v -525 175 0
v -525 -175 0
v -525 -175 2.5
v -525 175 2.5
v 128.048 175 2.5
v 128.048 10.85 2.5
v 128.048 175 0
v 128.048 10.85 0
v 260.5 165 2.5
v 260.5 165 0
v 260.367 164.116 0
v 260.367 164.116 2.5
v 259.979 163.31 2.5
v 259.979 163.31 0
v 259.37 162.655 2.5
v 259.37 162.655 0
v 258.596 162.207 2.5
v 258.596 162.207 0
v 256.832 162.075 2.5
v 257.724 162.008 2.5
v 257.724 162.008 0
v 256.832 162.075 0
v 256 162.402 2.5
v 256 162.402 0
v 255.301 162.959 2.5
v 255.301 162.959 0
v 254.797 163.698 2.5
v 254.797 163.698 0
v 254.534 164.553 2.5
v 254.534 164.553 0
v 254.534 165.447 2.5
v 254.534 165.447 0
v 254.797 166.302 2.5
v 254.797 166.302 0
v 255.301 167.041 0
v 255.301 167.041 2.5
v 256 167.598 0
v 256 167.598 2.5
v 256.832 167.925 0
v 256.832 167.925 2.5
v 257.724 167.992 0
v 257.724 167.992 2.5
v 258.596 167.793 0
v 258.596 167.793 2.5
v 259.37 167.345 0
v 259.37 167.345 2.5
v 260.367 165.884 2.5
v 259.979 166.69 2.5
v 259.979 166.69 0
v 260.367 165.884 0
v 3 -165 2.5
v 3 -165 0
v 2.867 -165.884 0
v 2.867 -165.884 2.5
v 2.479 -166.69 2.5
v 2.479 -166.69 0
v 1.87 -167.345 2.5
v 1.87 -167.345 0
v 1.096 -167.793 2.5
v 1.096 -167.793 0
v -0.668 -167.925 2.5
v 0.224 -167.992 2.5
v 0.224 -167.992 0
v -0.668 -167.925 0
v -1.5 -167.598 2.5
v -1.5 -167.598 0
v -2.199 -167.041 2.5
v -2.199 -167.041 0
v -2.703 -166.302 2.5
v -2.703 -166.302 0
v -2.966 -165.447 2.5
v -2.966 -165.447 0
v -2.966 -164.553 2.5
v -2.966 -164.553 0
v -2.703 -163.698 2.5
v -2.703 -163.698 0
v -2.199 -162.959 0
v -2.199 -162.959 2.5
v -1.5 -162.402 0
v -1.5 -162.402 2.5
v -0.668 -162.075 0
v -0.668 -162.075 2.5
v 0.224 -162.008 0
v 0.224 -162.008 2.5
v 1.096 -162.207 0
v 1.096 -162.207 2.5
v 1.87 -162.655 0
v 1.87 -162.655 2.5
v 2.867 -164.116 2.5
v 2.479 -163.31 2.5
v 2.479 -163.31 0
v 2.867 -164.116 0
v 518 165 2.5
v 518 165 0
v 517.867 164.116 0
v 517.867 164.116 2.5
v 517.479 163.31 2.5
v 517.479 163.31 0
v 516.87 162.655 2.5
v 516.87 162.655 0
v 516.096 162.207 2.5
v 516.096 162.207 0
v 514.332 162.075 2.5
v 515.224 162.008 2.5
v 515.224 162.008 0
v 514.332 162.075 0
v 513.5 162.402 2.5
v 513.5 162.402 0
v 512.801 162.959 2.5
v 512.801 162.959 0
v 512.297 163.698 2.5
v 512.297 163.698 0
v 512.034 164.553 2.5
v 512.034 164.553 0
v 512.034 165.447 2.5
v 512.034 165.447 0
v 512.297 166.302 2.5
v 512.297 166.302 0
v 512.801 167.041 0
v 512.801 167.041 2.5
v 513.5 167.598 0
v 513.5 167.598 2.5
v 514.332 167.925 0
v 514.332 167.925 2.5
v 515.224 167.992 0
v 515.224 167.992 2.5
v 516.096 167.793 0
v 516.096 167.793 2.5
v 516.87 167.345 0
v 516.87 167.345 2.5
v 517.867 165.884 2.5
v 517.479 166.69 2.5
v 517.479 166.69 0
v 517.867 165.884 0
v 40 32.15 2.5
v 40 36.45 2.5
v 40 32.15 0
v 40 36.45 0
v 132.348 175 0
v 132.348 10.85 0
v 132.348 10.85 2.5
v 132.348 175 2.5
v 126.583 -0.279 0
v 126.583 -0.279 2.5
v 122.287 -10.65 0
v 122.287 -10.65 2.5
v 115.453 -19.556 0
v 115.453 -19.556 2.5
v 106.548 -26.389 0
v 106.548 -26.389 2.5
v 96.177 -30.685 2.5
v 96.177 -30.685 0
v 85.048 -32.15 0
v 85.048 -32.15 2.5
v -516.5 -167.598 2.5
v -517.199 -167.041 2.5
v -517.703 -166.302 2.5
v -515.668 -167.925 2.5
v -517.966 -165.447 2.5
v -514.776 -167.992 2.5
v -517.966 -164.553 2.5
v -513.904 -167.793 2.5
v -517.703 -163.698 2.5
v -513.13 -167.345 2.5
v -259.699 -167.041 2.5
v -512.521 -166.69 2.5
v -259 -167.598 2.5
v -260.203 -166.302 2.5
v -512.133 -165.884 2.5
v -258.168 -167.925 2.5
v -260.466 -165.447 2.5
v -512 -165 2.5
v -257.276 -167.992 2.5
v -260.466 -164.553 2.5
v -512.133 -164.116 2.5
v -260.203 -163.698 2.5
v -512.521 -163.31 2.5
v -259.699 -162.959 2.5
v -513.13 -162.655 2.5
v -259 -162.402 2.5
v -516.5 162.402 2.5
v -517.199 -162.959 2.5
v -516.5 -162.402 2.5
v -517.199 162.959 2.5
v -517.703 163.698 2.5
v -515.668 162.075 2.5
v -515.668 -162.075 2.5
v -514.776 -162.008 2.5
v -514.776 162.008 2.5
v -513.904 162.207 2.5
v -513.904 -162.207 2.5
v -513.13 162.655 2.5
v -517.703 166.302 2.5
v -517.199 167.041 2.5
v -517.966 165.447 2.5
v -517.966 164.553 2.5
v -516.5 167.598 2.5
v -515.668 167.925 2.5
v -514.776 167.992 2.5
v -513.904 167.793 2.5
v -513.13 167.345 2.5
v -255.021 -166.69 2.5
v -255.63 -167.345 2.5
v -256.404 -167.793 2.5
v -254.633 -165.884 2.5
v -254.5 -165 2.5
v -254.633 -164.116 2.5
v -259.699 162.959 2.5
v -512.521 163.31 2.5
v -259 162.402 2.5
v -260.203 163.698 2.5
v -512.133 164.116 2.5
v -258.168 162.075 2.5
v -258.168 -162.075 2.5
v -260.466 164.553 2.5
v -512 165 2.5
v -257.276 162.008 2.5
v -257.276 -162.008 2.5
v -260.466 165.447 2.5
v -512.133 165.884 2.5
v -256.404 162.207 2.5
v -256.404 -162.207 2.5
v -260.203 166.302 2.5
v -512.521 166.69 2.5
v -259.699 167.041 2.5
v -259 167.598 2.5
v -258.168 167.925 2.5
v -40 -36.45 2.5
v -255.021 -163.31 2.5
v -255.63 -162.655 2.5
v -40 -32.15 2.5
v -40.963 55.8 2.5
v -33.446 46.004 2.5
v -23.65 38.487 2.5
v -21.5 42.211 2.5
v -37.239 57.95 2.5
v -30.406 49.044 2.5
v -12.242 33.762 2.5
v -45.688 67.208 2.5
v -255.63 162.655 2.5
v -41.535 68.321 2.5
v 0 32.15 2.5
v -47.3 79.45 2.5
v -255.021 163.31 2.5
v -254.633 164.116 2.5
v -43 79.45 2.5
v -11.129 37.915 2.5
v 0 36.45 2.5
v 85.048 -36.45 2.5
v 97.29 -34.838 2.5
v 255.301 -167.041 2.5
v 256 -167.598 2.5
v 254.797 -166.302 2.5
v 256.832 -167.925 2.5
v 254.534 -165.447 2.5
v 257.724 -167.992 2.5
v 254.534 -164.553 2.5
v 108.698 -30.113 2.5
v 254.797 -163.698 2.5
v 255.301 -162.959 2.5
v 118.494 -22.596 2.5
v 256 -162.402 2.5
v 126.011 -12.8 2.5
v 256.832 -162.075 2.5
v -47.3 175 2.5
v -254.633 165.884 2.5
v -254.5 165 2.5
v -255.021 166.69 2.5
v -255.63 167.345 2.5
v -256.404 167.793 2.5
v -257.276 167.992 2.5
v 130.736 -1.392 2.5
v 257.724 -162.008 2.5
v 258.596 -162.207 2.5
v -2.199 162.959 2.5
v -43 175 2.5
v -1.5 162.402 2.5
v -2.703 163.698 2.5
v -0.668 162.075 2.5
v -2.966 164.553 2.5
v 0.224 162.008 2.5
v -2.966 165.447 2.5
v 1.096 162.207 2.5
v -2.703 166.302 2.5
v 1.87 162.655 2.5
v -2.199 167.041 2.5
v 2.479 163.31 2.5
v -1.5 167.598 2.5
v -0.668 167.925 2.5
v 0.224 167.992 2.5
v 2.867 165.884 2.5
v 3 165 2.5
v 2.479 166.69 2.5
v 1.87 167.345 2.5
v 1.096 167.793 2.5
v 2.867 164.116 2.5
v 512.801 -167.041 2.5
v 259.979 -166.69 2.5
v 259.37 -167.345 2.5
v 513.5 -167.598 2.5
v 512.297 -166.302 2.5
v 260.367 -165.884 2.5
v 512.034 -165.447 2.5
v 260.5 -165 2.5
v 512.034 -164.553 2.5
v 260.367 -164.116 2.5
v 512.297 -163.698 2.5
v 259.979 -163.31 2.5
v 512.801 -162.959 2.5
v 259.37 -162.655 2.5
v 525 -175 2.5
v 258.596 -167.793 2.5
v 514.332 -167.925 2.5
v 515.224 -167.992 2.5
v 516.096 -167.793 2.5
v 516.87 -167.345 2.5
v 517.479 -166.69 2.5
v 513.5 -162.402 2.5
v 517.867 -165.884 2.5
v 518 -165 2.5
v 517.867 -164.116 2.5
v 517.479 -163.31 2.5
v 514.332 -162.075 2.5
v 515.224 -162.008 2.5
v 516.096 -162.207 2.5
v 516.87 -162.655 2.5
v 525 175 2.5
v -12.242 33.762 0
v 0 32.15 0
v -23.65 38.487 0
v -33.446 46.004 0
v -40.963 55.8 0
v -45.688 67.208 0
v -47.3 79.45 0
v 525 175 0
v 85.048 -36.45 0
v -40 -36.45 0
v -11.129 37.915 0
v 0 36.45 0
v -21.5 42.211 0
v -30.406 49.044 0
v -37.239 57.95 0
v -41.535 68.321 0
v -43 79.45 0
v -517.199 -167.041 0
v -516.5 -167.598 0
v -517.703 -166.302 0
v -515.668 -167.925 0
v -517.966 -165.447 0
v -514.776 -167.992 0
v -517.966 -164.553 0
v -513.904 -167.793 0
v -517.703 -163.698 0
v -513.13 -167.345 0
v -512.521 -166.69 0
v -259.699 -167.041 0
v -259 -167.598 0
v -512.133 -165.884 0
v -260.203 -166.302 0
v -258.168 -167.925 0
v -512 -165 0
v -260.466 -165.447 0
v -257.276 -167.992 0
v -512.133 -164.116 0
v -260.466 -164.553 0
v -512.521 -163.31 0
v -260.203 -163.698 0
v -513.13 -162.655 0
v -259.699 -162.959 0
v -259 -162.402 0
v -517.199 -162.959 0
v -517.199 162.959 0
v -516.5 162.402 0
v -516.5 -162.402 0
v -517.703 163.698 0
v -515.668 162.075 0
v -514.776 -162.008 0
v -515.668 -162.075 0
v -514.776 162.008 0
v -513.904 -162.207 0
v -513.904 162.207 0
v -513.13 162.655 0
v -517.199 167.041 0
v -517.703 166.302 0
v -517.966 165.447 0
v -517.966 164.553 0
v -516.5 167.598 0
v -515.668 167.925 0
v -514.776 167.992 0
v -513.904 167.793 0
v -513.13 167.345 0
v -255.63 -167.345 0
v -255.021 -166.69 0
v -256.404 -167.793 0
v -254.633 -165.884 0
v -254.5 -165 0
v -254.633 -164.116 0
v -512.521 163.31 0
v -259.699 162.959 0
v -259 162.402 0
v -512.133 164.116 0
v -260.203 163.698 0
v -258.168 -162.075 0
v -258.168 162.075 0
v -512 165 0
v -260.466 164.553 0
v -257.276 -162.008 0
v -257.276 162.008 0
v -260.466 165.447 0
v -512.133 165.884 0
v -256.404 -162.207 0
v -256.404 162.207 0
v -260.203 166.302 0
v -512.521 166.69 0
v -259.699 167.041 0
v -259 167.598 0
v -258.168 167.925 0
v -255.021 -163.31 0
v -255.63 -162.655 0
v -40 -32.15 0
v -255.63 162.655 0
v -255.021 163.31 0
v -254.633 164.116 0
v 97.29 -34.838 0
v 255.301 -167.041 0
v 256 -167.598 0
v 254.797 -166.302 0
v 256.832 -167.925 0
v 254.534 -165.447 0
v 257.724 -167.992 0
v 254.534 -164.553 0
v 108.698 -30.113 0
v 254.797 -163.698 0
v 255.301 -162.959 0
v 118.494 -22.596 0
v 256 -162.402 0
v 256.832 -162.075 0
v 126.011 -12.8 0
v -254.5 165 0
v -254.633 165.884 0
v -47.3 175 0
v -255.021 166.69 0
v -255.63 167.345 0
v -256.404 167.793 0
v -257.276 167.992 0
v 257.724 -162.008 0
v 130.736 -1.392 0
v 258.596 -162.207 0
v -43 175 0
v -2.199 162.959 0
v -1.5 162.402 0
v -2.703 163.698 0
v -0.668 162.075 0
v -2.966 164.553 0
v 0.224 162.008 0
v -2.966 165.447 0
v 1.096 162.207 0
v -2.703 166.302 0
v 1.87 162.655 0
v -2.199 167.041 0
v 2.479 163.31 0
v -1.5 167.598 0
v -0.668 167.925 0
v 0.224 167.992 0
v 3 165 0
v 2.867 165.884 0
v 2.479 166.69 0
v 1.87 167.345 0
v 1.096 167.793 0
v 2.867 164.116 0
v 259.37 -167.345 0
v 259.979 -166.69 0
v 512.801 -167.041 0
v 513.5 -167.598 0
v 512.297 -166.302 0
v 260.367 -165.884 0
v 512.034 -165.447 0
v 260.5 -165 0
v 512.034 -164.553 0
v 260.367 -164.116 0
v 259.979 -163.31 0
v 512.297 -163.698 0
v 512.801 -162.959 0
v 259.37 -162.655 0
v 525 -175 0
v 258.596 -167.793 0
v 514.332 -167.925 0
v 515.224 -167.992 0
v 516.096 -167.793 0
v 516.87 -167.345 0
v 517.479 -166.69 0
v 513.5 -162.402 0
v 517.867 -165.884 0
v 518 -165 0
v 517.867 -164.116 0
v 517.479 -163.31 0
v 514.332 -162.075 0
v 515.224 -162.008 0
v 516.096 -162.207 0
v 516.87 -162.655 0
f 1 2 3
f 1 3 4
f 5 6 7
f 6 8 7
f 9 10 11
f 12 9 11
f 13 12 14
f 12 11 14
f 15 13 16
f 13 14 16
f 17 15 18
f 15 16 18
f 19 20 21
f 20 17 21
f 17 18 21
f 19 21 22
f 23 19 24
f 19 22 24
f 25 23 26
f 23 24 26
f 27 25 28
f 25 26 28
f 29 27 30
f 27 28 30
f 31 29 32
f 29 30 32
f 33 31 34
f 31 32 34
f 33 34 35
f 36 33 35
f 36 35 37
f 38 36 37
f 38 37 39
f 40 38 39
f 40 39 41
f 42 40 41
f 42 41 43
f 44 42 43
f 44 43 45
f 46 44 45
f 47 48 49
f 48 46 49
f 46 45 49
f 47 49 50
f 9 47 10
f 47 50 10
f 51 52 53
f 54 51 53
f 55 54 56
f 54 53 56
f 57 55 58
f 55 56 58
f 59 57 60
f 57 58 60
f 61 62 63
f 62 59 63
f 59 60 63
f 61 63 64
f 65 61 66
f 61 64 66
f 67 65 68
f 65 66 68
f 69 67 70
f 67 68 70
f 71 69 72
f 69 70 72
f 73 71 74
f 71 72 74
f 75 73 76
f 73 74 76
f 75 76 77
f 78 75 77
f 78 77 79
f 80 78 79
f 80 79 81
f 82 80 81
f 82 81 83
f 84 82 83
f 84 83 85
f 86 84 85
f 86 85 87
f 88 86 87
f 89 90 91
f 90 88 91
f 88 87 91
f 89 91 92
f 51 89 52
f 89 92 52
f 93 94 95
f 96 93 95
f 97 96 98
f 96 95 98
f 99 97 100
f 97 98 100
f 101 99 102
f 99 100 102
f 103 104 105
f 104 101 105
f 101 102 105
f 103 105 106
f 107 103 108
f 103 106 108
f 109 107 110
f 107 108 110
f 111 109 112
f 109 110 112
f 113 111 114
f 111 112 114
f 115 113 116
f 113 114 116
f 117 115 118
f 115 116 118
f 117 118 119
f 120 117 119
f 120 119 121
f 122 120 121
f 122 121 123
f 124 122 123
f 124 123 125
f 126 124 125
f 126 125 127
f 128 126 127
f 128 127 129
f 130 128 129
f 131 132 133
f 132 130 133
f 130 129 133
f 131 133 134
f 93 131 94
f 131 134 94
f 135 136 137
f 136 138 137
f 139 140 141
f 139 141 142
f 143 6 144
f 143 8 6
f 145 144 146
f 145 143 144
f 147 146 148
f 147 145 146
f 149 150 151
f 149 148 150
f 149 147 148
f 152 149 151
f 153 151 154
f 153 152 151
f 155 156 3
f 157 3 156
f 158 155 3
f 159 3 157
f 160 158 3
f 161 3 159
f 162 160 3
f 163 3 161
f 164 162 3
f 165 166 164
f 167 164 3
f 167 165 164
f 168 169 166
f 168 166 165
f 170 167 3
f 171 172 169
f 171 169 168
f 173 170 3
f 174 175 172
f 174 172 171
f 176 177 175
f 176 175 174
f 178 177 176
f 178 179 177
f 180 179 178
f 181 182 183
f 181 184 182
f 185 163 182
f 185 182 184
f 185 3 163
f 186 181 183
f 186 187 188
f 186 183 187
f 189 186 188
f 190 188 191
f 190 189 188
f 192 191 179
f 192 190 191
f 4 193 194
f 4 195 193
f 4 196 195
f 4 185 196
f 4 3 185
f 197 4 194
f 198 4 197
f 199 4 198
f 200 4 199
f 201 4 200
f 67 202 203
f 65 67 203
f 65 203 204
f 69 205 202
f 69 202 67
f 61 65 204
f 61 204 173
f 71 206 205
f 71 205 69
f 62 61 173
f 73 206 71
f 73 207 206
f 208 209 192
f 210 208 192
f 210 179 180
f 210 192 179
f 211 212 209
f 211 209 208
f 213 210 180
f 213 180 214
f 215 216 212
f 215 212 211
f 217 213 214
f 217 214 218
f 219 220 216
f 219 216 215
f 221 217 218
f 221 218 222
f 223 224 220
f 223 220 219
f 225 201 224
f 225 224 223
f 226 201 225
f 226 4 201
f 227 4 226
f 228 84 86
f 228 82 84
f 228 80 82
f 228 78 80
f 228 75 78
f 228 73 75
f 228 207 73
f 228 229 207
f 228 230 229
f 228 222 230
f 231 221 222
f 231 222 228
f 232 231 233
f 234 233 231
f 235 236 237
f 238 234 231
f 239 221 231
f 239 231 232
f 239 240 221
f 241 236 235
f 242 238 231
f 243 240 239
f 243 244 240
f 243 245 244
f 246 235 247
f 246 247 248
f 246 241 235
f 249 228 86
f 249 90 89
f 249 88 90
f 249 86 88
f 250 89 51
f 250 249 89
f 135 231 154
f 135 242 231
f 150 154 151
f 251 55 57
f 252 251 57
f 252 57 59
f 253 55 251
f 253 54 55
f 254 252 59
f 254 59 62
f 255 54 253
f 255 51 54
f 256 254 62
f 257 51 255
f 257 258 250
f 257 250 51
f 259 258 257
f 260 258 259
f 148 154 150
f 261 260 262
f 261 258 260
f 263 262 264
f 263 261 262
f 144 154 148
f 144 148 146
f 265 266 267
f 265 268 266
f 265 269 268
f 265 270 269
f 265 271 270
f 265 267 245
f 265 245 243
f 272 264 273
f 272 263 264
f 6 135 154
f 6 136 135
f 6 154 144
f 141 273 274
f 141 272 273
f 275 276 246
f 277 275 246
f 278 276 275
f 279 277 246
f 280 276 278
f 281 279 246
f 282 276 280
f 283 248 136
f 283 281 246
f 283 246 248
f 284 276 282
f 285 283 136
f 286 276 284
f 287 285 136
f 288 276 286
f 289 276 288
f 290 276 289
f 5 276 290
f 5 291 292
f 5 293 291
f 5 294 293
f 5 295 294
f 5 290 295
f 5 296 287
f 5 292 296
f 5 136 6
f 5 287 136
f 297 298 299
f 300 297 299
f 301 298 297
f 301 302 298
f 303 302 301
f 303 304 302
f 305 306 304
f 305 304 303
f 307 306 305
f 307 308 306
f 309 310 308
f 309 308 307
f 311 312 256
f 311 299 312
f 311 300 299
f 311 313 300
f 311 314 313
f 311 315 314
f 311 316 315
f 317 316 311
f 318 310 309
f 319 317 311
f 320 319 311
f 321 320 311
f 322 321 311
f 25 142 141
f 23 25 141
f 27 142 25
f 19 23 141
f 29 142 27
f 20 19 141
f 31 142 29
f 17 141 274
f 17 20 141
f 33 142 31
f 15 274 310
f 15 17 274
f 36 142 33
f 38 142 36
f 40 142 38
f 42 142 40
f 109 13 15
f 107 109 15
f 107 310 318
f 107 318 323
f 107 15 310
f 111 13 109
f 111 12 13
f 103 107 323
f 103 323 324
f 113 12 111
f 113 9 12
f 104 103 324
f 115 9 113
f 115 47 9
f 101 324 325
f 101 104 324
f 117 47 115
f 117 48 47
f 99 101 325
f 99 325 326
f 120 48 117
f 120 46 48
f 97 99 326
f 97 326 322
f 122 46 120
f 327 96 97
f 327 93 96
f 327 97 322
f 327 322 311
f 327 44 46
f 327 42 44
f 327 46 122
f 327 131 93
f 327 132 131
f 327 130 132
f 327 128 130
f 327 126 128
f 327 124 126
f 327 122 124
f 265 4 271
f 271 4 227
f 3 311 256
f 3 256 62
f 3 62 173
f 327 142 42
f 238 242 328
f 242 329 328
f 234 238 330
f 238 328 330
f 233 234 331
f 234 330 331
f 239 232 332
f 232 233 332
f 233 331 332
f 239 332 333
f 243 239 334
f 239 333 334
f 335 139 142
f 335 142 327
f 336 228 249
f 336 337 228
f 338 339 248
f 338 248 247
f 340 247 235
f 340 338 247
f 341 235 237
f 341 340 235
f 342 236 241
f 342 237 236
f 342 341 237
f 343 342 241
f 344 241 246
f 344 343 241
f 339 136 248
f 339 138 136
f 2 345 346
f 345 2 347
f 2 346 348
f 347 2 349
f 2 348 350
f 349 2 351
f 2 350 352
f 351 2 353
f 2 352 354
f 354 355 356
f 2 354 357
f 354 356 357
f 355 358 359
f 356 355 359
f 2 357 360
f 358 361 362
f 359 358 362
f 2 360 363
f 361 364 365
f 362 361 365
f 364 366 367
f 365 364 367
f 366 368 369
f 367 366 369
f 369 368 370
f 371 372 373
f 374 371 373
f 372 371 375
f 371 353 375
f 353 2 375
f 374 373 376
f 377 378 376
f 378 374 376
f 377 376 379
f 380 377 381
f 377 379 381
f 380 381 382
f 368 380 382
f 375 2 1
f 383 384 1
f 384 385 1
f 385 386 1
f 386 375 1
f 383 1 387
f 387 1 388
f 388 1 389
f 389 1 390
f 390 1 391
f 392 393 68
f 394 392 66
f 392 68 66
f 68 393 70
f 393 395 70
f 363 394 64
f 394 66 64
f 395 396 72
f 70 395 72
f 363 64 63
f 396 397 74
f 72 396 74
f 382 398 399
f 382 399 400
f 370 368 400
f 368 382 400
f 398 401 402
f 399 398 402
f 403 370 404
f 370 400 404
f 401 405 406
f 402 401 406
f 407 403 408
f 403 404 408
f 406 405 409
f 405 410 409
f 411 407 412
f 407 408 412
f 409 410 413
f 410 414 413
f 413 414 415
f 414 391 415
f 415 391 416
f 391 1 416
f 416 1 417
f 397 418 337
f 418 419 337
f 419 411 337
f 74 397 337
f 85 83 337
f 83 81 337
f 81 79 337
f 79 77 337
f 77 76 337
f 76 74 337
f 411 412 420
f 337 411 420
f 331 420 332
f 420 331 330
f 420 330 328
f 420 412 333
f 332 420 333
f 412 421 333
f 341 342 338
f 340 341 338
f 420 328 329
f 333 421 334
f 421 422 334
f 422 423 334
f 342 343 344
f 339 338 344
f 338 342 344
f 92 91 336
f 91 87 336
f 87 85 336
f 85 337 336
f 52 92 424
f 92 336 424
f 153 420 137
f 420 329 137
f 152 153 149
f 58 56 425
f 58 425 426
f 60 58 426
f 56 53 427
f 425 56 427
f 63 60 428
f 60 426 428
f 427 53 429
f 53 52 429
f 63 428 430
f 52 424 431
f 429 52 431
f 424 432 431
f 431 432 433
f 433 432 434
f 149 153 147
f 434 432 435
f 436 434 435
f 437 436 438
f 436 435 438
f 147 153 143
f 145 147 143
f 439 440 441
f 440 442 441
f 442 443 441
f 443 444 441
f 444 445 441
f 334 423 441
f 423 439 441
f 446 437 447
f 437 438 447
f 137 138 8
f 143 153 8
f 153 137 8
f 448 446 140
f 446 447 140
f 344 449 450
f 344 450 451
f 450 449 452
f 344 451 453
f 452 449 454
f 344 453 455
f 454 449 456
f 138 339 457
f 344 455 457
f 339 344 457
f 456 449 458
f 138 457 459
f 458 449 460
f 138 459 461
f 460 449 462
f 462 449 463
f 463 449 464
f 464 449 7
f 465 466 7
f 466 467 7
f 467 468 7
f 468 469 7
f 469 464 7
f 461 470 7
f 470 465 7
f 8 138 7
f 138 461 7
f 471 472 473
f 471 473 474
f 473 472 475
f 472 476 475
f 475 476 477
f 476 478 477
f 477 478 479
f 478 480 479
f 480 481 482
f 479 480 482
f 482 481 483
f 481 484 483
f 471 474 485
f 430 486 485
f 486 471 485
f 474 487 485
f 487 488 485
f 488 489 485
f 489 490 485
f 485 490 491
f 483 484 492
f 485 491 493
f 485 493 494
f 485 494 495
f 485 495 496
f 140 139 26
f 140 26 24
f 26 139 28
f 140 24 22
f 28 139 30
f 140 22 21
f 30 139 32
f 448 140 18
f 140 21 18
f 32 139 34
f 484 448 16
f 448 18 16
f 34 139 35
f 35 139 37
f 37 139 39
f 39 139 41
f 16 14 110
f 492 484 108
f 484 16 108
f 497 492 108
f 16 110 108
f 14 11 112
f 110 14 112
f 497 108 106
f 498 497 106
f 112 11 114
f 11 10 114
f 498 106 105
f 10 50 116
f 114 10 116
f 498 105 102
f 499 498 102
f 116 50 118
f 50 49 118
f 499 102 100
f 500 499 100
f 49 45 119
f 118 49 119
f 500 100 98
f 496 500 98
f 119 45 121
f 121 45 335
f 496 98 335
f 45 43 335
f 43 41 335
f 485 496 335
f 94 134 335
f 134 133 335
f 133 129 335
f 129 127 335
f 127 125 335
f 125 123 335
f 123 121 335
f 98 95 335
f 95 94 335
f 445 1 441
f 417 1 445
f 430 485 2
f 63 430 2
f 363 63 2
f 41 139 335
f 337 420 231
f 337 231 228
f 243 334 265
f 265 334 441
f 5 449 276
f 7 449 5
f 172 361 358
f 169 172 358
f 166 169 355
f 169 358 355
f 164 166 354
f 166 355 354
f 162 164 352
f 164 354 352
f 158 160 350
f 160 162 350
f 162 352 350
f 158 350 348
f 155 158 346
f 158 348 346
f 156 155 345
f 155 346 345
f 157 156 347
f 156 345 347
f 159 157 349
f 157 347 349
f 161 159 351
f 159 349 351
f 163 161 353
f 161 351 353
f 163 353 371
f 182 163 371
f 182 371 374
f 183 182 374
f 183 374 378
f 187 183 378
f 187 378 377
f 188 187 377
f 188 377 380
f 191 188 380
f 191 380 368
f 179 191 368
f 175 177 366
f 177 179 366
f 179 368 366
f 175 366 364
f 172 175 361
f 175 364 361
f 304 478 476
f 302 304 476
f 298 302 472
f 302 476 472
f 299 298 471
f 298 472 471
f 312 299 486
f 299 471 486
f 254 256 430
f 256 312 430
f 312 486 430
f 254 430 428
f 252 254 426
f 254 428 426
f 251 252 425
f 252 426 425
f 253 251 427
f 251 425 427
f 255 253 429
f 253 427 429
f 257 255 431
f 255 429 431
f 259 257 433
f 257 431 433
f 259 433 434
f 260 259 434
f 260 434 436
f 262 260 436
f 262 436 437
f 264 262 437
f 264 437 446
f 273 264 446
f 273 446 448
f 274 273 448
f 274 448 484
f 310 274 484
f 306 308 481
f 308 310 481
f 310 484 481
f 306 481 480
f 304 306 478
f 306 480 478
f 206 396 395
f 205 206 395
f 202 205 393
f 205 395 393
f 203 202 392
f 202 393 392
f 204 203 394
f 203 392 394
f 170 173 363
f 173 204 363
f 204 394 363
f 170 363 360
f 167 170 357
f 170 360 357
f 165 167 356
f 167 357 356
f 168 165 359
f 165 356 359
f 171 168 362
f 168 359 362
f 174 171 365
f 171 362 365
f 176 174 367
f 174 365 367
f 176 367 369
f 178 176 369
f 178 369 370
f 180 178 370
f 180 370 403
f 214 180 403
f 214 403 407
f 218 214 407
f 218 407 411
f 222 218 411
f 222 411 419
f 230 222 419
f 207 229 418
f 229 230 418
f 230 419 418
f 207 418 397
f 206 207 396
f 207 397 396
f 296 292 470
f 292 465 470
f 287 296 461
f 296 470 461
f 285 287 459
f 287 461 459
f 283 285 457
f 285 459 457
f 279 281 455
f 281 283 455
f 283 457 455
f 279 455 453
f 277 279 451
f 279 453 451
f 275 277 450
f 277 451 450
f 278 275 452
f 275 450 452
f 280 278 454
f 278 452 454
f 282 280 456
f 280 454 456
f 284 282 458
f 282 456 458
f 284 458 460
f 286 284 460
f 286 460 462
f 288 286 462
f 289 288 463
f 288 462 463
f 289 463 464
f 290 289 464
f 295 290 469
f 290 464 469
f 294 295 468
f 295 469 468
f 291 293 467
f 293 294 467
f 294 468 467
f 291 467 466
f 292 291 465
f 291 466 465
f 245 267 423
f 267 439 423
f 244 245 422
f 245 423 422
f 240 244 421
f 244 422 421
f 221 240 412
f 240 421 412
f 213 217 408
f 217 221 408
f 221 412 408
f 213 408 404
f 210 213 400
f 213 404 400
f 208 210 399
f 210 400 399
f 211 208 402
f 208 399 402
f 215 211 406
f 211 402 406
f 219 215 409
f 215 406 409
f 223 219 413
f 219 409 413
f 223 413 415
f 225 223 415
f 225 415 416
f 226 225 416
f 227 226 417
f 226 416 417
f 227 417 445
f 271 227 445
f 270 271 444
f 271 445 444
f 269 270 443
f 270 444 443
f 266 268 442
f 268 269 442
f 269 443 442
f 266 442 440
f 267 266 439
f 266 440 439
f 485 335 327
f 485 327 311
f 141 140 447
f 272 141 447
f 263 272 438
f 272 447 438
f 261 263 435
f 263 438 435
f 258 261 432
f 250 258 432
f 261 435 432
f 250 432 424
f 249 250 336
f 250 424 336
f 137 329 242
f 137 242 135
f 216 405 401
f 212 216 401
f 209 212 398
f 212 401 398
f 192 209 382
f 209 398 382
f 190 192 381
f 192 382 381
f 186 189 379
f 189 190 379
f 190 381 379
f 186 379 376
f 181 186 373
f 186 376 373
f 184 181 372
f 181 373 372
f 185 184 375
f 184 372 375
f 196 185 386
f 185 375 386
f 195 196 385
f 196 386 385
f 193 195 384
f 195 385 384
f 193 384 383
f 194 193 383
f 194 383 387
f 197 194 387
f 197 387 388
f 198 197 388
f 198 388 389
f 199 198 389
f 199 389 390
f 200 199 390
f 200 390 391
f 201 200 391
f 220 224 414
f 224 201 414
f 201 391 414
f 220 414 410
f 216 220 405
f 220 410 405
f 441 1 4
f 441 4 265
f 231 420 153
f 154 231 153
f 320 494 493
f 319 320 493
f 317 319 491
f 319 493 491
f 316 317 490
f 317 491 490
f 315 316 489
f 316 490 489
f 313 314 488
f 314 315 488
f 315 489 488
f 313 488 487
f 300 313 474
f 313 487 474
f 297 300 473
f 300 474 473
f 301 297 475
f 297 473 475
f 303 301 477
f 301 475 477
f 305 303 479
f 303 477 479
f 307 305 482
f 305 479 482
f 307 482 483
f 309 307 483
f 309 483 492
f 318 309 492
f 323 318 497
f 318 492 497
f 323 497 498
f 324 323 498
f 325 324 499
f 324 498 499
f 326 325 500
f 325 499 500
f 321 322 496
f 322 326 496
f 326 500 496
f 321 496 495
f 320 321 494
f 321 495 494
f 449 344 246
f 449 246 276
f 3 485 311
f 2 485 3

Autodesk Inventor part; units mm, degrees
ref_plane "YZ Plane" through (0, 0, 0) normal (1, 0, 0) x (0, 1, 0)
ref_plane "XZ Plane" through (0, 0, 0) normal (0, 1, 0) x (-1, 0, 0)
ref_plane "XY Plane" through (0, 0, 0) normal (0, 0, 1) x (1, 0, 0)
sketch "Sketch1" plane through (0, 0, 0) normal (0, 0, 1) x (1, 0, 0)
  line L0 (-525, 175) -> (525, 175)
  line L1 (-525, -175) -> (-525, 175)
  line L2 (525, -175) -> (-525, -175)
  line L3 (525, 175) -> (525, -175)
  circle A0 centre (515, -165) radius 3
  circle A1 centre (-257.5, -165) radius 3
  circle A2 centre (515, 165) radius 3
  circle A3 centre (257.5, 165) radius 3
  circle A4 centre (0, 165) radius 3
  circle A5 centre (-257.5, 165) radius 3
  circle A6 centre (-515, 165) radius 3
  circle A7 centre (257.5, -165) radius 3
  circle A8 centre (0, -165) radius 3
  circle A9 centre (-515, -165) radius 3
  arc A10 (-434.5, -36.45) -> (-475.35, -77.3) centre (-434.5, -77.3) ccw
  line L4 (-475.35, -85.5) -> (-475.35, -77.3)
  arc A11 (-475.35, -85.5) -> (-434.5, -126.35) centre (-434.5, -85.5) ccw
  line L5 (434.5, -126.35) -> (-434.5, -126.35)
  arc A12 (434.5, -126.35) -> (475.35, -85.5) centre (434.5, -85.5) ccw
  line L6 (475.35, -65.8667) -> (475.35, -85.5)
  arc A13 (475.35, -65.8667) -> (434.5, -25.0167) centre (434.5, -65.8667) ccw
  line L7 (-445.75, -25.0167) -> (434.5, -25.0167)
  arc A14 (-445.75, -25.0167) -> (-486.6, -65.8667) centre (-445.75, -65.8667) ccw
  line L8 (-486.6, -96.25) -> (-486.6, -65.8667)
  arc A15 (-486.6, -96.25) -> (-445.75, -137.1) centre (-445.75, -96.25) ccw
  line L9 (445.75, -137.1) -> (-445.75, -137.1)
  arc A16 (445.75, -137.1) -> (486.6, -96.25) centre (445.75, -96.25) ccw
  line L10 (486.6, -54.4333) -> (486.6, -96.25)
  arc A17 (486.6, -54.4333) -> (445.75, -13.5833) centre (445.75, -54.4333) ccw
  line L11 (-457, -13.5833) -> (445.75, -13.5833)
  arc A18 (-457, -13.5833) -> (-497.85, -54.4333) centre (-457, -54.4333) ccw
  line L12 (-497.85, -107) -> (-497.85, -54.4333)
  arc A19 (-497.85, -107) -> (-457, -147.85) centre (-457, -107) ccw
  line L13 (457, -147.85) -> (-457, -147.85)
  arc A20 (457, -147.85) -> (497.85, -107) centre (457, -107) ccw
  line L14 (497.85, -43) -> (497.85, -107)
  arc A21 (497.85, -43) -> (457, -2.15) centre (457, -43) ccw
  line L15 (-457, -2.15) -> (457, -2.15)
  arc A22 (-502.15, 43) -> (-457, -2.15) centre (-457, 43) ccw
  line L16 (-502.15, 107) -> (-502.15, 43)
  arc A23 (-457, 152.15) -> (-502.15, 107) centre (-457, 107) ccw
  line L17 (457, 152.15) -> (-457, 152.15)
  arc A24 (502.15, 107) -> (457, 152.15) centre (457, 107) ccw
  line L18 (502.15, 54.4333) -> (502.15, 107)
  arc A25 (457, 9.2833) -> (502.15, 54.4333) centre (457, 54.4333) ccw
  line L19 (-445.75, 9.2833) -> (457, 9.2833)
  arc A26 (-490.9, 54.4333) -> (-445.75, 9.2833) centre (-445.75, 54.4333) ccw
  line L20 (-490.9, 96.25) -> (-490.9, 54.4333)
  arc A27 (-445.75, 141.4) -> (-490.9, 96.25) centre (-445.75, 96.25) ccw
  line L21 (445.75, 141.4) -> (-445.75, 141.4)
  arc A28 (490.9, 96.25) -> (445.75, 141.4) centre (445.75, 96.25) ccw
  line L22 (490.9, 65.8667) -> (490.9, 96.25)
  arc A29 (445.75, 20.7167) -> (490.9, 65.8667) centre (445.75, 65.8667) ccw
  line L23 (-434.5, 20.7167) -> (445.75, 20.7167)
  arc A30 (-479.65, 65.8667) -> (-434.5, 20.7167) centre (-434.5, 65.8667) ccw
  line L24 (-479.65, 85.5) -> (-479.65, 65.8667)
  arc A31 (-434.5, 130.65) -> (-479.65, 85.5) centre (-434.5, 85.5) ccw
  line L25 (434.5, 130.65) -> (-434.5, 130.65)
  arc A32 (479.65, 85.5) -> (434.5, 130.65) centre (434.5, 85.5) ccw
  line L26 (479.65, 77.3) -> (479.65, 85.5)
  arc A33 (434.5, 32.15) -> (479.65, 77.3) centre (434.5, 77.3) ccw
  line L27 (0, 32.15) -> (434.5, 32.15)
  line L28 (0, 36.45) -> (0, 32.15)
  line L29 (434.5, 36.45) -> (0, 36.45)
  arc A34 (434.5, 36.45) -> (475.35, 77.3) centre (434.5, 77.3) ccw
  line L30 (475.35, 85.5) -> (475.35, 77.3)
  arc A35 (475.35, 85.5) -> (434.5, 126.35) centre (434.5, 85.5) ccw
  line L31 (-434.5, 126.35) -> (434.5, 126.35)
  arc A36 (-434.5, 126.35) -> (-475.35, 85.5) centre (-434.5, 85.5) ccw
  line L32 (-475.35, 65.8667) -> (-475.35, 85.5)
  arc A37 (-475.35, 65.8667) -> (-434.5, 25.0167) centre (-434.5, 65.8667) ccw
  line L33 (445.75, 25.0167) -> (-434.5, 25.0167)
  arc A38 (445.75, 25.0167) -> (486.6, 65.8667) centre (445.75, 65.8667) ccw
  line L34 (486.6, 96.25) -> (486.6, 65.8667)
  arc A39 (486.6, 96.25) -> (445.75, 137.1) centre (445.75, 96.25) ccw
  line L35 (-445.75, 137.1) -> (445.75, 137.1)
  arc A40 (-445.75, 137.1) -> (-486.6, 96.25) centre (-445.75, 96.25) ccw
  line L36 (-486.6, 54.4333) -> (-486.6, 96.25)
  arc A41 (-486.6, 54.4333) -> (-445.75, 13.5833) centre (-445.75, 54.4333) ccw
  line L37 (457, 13.5833) -> (-445.75, 13.5833)
  arc A42 (457, 13.5833) -> (497.85, 54.4333) centre (457, 54.4333) ccw
  line L38 (497.85, 107) -> (497.85, 54.4333)
  arc A43 (497.85, 107) -> (457, 147.85) centre (457, 107) ccw
  line L39 (-457, 147.85) -> (457, 147.85)
  arc A44 (-457, 147.85) -> (-497.85, 107) centre (-457, 107) ccw
  line L40 (-497.85, 43) -> (-497.85, 107)
  arc A45 (-497.85, 43) -> (-457, 2.15) centre (-457, 43) ccw
  line L41 (457, 2.15) -> (-457, 2.15)
  arc A46 (502.15, -43) -> (457, 2.15) centre (457, -43) ccw
  line L42 (502.15, -107) -> (502.15, -43)
  arc A47 (457, -152.15) -> (502.15, -107) centre (457, -107) ccw
  line L43 (-457, -152.15) -> (457, -152.15)
  arc A48 (-502.15, -107) -> (-457, -152.15) centre (-457, -107) ccw
  line L44 (-502.15, -54.4333) -> (-502.15, -107)
  arc A49 (-457, -9.2833) -> (-502.15, -54.4333) centre (-457, -54.4333) ccw
  line L45 (445.75, -9.2833) -> (-457, -9.2833)
  arc A50 (490.9, -54.4333) -> (445.75, -9.2833) centre (445.75, -54.4333) ccw
  line L46 (490.9, -96.25) -> (490.9, -54.4333)
  arc A51 (445.75, -141.4) -> (490.9, -96.25) centre (445.75, -96.25) ccw
  line L47 (-445.75, -141.4) -> (445.75, -141.4)
  arc A52 (-490.9, -96.25) -> (-445.75, -141.4) centre (-445.75, -96.25) ccw
  line L48 (-490.9, -65.8667) -> (-490.9, -96.25)
  arc A53 (-445.75, -20.7167) -> (-490.9, -65.8667) centre (-445.75, -65.8667) ccw
  line L49 (434.5, -20.7167) -> (-445.75, -20.7167)
  arc A54 (479.65, -65.8667) -> (434.5, -20.7167) centre (434.5, -65.8667) ccw
  line L50 (479.65, -85.5) -> (479.65, -65.8667)
  arc A55 (434.5, -130.65) -> (479.65, -85.5) centre (434.5, -85.5) ccw
  line L51 (-434.5, -130.65) -> (434.5, -130.65)
  arc A56 (-479.65, -85.5) -> (-434.5, -130.65) centre (-434.5, -85.5) ccw
  line L52 (-479.65, -77.3) -> (-479.65, -85.5)
  arc A57 (-434.5, -32.15) -> (-479.65, -77.3) centre (-434.5, -77.3) ccw
  line L53 (0, -32.15) -> (-434.5, -32.15)
  line L54 (0, -36.45) -> (0, -32.15)
  line L55 (-434.5, -36.45) -> (0, -36.45)
  line L56 (-525, 175) -> (525, 175)
  line L57 (-525, -175) -> (-525, 175)
  line L58 (525, -175) -> (-525, -175)
  line L59 (525, 175) -> (525, -175)
  circle A58 centre (515, -165) radius 3
  circle A59 centre (-257.5, -165) radius 3
  circle A60 centre (515, 165) radius 3
  circle A61 centre (257.5, 165) radius 3
  circle A62 centre (0, 165) radius 3
  circle A63 centre (-257.5, 165) radius 3
  circle A64 centre (-515, 165) radius 3
  circle A65 centre (257.5, -165) radius 3
  circle A66 centre (0, -165) radius 3
  circle A67 centre (-515, -165) radius 3
  arc A68 (-434.5, -36.45) -> (-475.35, -77.3) centre (-434.5, -77.3) ccw
  line L60 (-475.35, -85.5) -> (-475.35, -77.3)
  arc A69 (-475.35, -85.5) -> (-434.5, -126.35) centre (-434.5, -85.5) ccw
  line L61 (434.5, -126.35) -> (-434.5, -126.35)
  arc A70 (434.5, -126.35) -> (475.35, -85.5) centre (434.5, -85.5) ccw
  line L62 (475.35, -65.8667) -> (475.35, -85.5)
  arc A71 (475.35, -65.8667) -> (434.5, -25.0167) centre (434.5, -65.8667) ccw
  line L63 (-445.75, -25.0167) -> (434.5, -25.0167)
  arc A72 (-445.75, -25.0167) -> (-486.6, -65.8667) centre (-445.75, -65.8667) ccw
  line L64 (-486.6, -96.25) -> (-486.6, -65.8667)
  arc A73 (-486.6, -96.25) -> (-445.75, -137.1) centre (-445.75, -96.25) ccw
  line L65 (445.75, -137.1) -> (-445.75, -137.1)
  arc A74 (445.75, -137.1) -> (486.6, -96.25) centre (445.75, -96.25) ccw
  line L66 (486.6, -54.4333) -> (486.6, -96.25)
  arc A75 (486.6, -54.4333) -> (445.75, -13.5833) centre (445.75, -54.4333) ccw
  line L67 (-457, -13.5833) -> (445.75, -13.5833)
  arc A76 (-457, -13.5833) -> (-497.85, -54.4333) centre (-457, -54.4333) ccw
  line L68 (-497.85, -107) -> (-497.85, -54.4333)
  arc A77 (-497.85, -107) -> (-457, -147.85) centre (-457, -107) ccw
  line L69 (457, -147.85) -> (-457, -147.85)
  arc A78 (457, -147.85) -> (497.85, -107) centre (457, -107) ccw
  line L70 (497.85, -43) -> (497.85, -107)
  arc A79 (497.85, -43) -> (457, -2.15) centre (457, -43) ccw
  line L71 (-457, -2.15) -> (457, -2.15)
  arc A80 (-502.15, 43) -> (-457, -2.15) centre (-457, 43) ccw
  line L72 (-502.15, 107) -> (-502.15, 43)
  arc A81 (-457, 152.15) -> (-502.15, 107) centre (-457, 107) ccw
  line L73 (457, 152.15) -> (-457, 152.15)
  arc A82 (502.15, 107) -> (457, 152.15) centre (457, 107) ccw
  line L74 (502.15, 54.4333) -> (502.15, 107)
  arc A83 (457, 9.2833) -> (502.15, 54.4333) centre (457, 54.4333) ccw
  line L75 (-445.75, 9.2833) -> (457, 9.2833)
  arc A84 (-490.9, 54.4333) -> (-445.75, 9.2833) centre (-445.75, 54.4333) ccw
  line L76 (-490.9, 96.25) -> (-490.9, 54.4333)
  arc A85 (-445.75, 141.4) -> (-490.9, 96.25) centre (-445.75, 96.25) ccw
  line L77 (445.75, 141.4) -> (-445.75, 141.4)
  arc A86 (490.9, 96.25) -> (445.75, 141.4) centre (445.75, 96.25) ccw
  line L78 (490.9, 65.8667) -> (490.9, 96.25)
  arc A87 (445.75, 20.7167) -> (490.9, 65.8667) centre (445.75, 65.8667) ccw
  line L79 (-434.5, 20.7167) -> (445.75, 20.7167)
  arc A88 (-479.65, 65.8667) -> (-434.5, 20.7167) centre (-434.5, 65.8667) ccw
  line L80 (-479.65, 85.5) -> (-479.65, 65.8667)
  arc A89 (-434.5, 130.65) -> (-479.65, 85.5) centre (-434.5, 85.5) ccw
  line L81 (434.5, 130.65) -> (-434.5, 130.65)
  arc A90 (479.65, 85.5) -> (434.5, 130.65) centre (434.5, 85.5) ccw
  line L82 (479.65, 77.3) -> (479.65, 85.5)
  arc A91 (434.5, 32.15) -> (479.65, 77.3) centre (434.5, 77.3) ccw
  line L83 (0, 32.15) -> (434.5, 32.15)
  line L84 (0, 36.45) -> (0, 32.15)
  line L85 (434.5, 36.45) -> (0, 36.45)
  arc A92 (434.5, 36.45) -> (475.35, 77.3) centre (434.5, 77.3) ccw
  line L86 (475.35, 85.5) -> (475.35, 77.3)
  arc A93 (475.35, 85.5) -> (434.5, 126.35) centre (434.5, 85.5) ccw
  line L87 (-434.5, 126.35) -> (434.5, 126.35)
  arc A94 (-434.5, 126.35) -> (-475.35, 85.5) centre (-434.5, 85.5) ccw
  line L88 (-475.35, 65.8667) -> (-475.35, 85.5)
  arc A95 (-475.35, 65.8667) -> (-434.5, 25.0167) centre (-434.5, 65.8667) ccw
  line L89 (445.75, 25.0167) -> (-434.5, 25.0167)
  arc A96 (445.75, 25.0167) -> (486.6, 65.8667) centre (445.75, 65.8667) ccw
  line L90 (486.6, 96.25) -> (486.6, 65.8667)
  arc A97 (486.6, 96.25) -> (445.75, 137.1) centre (445.75, 96.25) ccw
  line L91 (-445.75, 137.1) -> (445.75, 137.1)
  arc A98 (-445.75, 137.1) -> (-486.6, 96.25) centre (-445.75, 96.25) ccw
  line L92 (-486.6, 54.4333) -> (-486.6, 96.25)
  arc A99 (-486.6, 54.4333) -> (-445.75, 13.5833) centre (-445.75, 54.4333) ccw
  line L93 (457, 13.5833) -> (-445.75, 13.5833)
  arc A100 (457, 13.5833) -> (497.85, 54.4333) centre (457, 54.4333) ccw
  line L94 (497.85, 107) -> (497.85, 54.4333)
  arc A101 (497.85, 107) -> (457, 147.85) centre (457, 107) ccw
  line L95 (-457, 147.85) -> (457, 147.85)
  arc A102 (-457, 147.85) -> (-497.85, 107) centre (-457, 107) ccw
  line L96 (-497.85, 43) -> (-497.85, 107)
  arc A103 (-497.85, 43) -> (-457, 2.15) centre (-457, 43) ccw
  line L97 (457, 2.15) -> (-457, 2.15)
  arc A104 (502.15, -43) -> (457, 2.15) centre (457, -43) ccw
  line L98 (502.15, -107) -> (502.15, -43)
  arc A105 (457, -152.15) -> (502.15, -107) centre (457, -107) ccw
  line L99 (-457, -152.15) -> (457, -152.15)
  arc A106 (-502.15, -107) -> (-457, -152.15) centre (-457, -107) ccw
  line L100 (-502.15, -54.4333) -> (-502.15, -107)
  arc A107 (-457, -9.2833) -> (-502.15, -54.4333) centre (-457, -54.4333) ccw
  line L101 (445.75, -9.2833) -> (-457, -9.2833)
  arc A108 (490.9, -54.4333) -> (445.75, -9.2833) centre (445.75, -54.4333) ccw
  line L102 (490.9, -96.25) -> (490.9, -54.4333)
  arc A109 (445.75, -141.4) -> (490.9, -96.25) centre (445.75, -96.25) ccw
  line L103 (-445.75, -141.4) -> (445.75, -141.4)
  arc A110 (-490.9, -96.25) -> (-445.75, -141.4) centre (-445.75, -96.25) ccw
  line L104 (-490.9, -65.8667) -> (-490.9, -96.25)
  arc A111 (-445.75, -20.7167) -> (-490.9, -65.8667) centre (-445.75, -65.8667) ccw
  line L105 (434.5, -20.7167) -> (-445.75, -20.7167)
  arc A112 (479.65, -65.8667) -> (434.5, -20.7167) centre (434.5, -65.8667) ccw
  line L106 (479.65, -85.5) -> (479.65, -65.8667)
  arc A113 (434.5, -130.65) -> (479.65, -85.5) centre (434.5, -85.5) ccw
  line L107 (-434.5, -130.65) -> (434.5, -130.65)
  arc A114 (-479.65, -85.5) -> (-434.5, -130.65) centre (-434.5, -85.5) ccw
  line L108 (-479.65, -77.3) -> (-479.65, -85.5)
  arc A115 (-434.5, -32.15) -> (-479.65, -77.3) centre (-434.5, -77.3) ccw
  line L109 (0, -32.15) -> (-434.5, -32.15)
  line L110 (0, -36.45) -> (0, -32.15)
  line L111 (-434.5, -36.45) -> (0, -36.45)
  line L112 (0, -32.15) -> (0, 10.85) construction
  line L113 (18.1865, 10.85) -> (0, 10.85) construction
  line L114 (0, -36.45) -> (0, 10.85) construction
  line L115 (25.3634, 10.85) -> (0, 10.85) construction
  arc A116 (-43, 79.45) -> (0, 36.45) centre (0, 79.45) ccw
  line L116 (0, 36.45) -> (0, 79.45) construction
  line L117 (-43, 79.45) -> (0, 79.45) construction
  arc A117 (-47.3, 79.45) -> (0, 32.15) centre (0, 79.45) ccw
  line L118 (0, 32.15) -> (0, 79.45) construction
  line L119 (-47.3, 79.45) -> (0, 79.45) construction
  line L120 (-43, 79.45) -> (-43, 175)
  line L121 (-47.3, 79.45) -> (-47.3, 175)
  line L122 (85.0479, 2.11) -> (85.0479, -106.33)
  line L123 (0, -36.45) -> (85.0479, -36.45)
  line L124 (0, -32.15) -> (85.0479, -32.15)
  arc A118 (85.0479, -32.15) -> (128.0479, 10.85) centre (85.0479, 10.85) ccw
  line L125 (85.0479, -32.15) -> (85.0479, 10.85) construction
  line L126 (128.0479, 10.85) -> (85.0479, 10.85) construction
  arc A119 (85.0479, -36.45) -> (132.3479, 10.85) centre (85.0479, 10.85) ccw
  line L127 (85.0479, -36.45) -> (85.0479, 10.85) construction
  line L128 (132.3479, 10.85) -> (85.0479, 10.85) construction
  line L129 (128.0479, 10.85) -> (128.0479, 175)
  line L130 (132.3479, 10.85) -> (132.3479, 175)
  line L131 (0, 36.45) -> (0, 32.15)
  line L132 (0, -36.45) -> (0, -32.15)
  line L133 (-40, -32.15) -> (-40, -36.45)
  line L134 (40, 36.45) -> (40, 32.15)
  point P0 (0, 0)
  point P1 (128.0479, 175)
  point P2 (132.3479, 175)
  dimension "d4" = 90
  dimension "d6" = 90
  dimension "d7" = 43
  dimension "d8" = 90
  dimension "d9" = 47.3
  dimension "d10" = 90
  dimension "d11" = 43
  dimension "d12" = 90
  dimension "d13" = 47.3
  dimension "d14" = 90
  dimension "d17" = 40
  dimension "d18" = 40
extrude "Extrusion1" add sketch "Sketch1" along normal blind 2.5 contours L0 L121 L17 A23 L16 A22 L15 L122 L45 A49 L44 A48 L43 A47 L42 A46 L41 A119 L19 A25 L18 A24 L130 L3 L2 L1 | L0 L129 L17 L120 | L121 L39 A44 L40 A45 L41 A118 L15 A22 L16 A23 L17 | L17 L129 L39 L120 | L121 L21 A27 L20 A26 L19 A118 L41 A45 L40 A44 L39 | L39 L129 L21 L120 | L121 L35 A40 L36 A41 L37 L129 A118 L19 A26 L20 A27 L21 | L17 A24 L18 A25 L19 A119 L130 L37 A42 L38 A43 L39 | L21 L129 L35 L120 | L121 L25 A31 L24 A30 L23 L129 L37 A41 L36 A40 L35 | L39 A43 L38 A42 L37 L130 L23 A29 L22 A28 L21 | L35 L129 L25 L120 | L121 L31 A36 L32 A37 L33 L129 L23 A30 L24 A31 L25 | L21 A28 L22 A29 L23 L130 L33 A38 L34 A39 L35 | L25 L129 L31 L120 | L15 A118 L45 L122 | L121 A117 L27 L129 L33 A37 L32 A36 L31 | L35 A39 L34 A38 L33 L130 L27 A33 L26 A32 L25 | L31 L129 L29 A116 L120 | L122 L11 A18 L12 A19 L13 A20 L14 A21 L15 A119 L41 A46 L42 A47 L43 A48 L44 A49 L45 | L45 A118 L11 L122 | L25 A32 L26 A33 L27 L130 L29 A34 L30 A35 L31 | L15 A21 L14 A20 L13 A19 L12 A18 L11 L122 L49 A53 L48 A52 L47 A51 L46 A50 L45 A119 | L11 A118 L49 L122 | L31 A35 L30 A34 L29 L130 | L129 L27 L134 L29 | L45 A50 L46 A51 L47 A52 L48 A53 L49 L122 L7 A14 L8 A15 L9 A16 L10 A17 L11 A119 | L49 A118 L7 L122 | L11 A17 L10 A16 L9 A15 L8 A14 L7 L122 L124 L53 A57 L52 A56 L51 A55 L50 A54 L49 A119 | L7 A118 L122 | L49 A54 L50 A55 L51 A56 L52 A57 L53 L133 L55 A10 L4 A11 L5 A12 L6 A13 L7 A119 | L7 A13 L6 A12 L5 A11 L4 A10 L55 L123 A119
properties part number "btwnFerriteAndCoil" material "LCP Plastic"
